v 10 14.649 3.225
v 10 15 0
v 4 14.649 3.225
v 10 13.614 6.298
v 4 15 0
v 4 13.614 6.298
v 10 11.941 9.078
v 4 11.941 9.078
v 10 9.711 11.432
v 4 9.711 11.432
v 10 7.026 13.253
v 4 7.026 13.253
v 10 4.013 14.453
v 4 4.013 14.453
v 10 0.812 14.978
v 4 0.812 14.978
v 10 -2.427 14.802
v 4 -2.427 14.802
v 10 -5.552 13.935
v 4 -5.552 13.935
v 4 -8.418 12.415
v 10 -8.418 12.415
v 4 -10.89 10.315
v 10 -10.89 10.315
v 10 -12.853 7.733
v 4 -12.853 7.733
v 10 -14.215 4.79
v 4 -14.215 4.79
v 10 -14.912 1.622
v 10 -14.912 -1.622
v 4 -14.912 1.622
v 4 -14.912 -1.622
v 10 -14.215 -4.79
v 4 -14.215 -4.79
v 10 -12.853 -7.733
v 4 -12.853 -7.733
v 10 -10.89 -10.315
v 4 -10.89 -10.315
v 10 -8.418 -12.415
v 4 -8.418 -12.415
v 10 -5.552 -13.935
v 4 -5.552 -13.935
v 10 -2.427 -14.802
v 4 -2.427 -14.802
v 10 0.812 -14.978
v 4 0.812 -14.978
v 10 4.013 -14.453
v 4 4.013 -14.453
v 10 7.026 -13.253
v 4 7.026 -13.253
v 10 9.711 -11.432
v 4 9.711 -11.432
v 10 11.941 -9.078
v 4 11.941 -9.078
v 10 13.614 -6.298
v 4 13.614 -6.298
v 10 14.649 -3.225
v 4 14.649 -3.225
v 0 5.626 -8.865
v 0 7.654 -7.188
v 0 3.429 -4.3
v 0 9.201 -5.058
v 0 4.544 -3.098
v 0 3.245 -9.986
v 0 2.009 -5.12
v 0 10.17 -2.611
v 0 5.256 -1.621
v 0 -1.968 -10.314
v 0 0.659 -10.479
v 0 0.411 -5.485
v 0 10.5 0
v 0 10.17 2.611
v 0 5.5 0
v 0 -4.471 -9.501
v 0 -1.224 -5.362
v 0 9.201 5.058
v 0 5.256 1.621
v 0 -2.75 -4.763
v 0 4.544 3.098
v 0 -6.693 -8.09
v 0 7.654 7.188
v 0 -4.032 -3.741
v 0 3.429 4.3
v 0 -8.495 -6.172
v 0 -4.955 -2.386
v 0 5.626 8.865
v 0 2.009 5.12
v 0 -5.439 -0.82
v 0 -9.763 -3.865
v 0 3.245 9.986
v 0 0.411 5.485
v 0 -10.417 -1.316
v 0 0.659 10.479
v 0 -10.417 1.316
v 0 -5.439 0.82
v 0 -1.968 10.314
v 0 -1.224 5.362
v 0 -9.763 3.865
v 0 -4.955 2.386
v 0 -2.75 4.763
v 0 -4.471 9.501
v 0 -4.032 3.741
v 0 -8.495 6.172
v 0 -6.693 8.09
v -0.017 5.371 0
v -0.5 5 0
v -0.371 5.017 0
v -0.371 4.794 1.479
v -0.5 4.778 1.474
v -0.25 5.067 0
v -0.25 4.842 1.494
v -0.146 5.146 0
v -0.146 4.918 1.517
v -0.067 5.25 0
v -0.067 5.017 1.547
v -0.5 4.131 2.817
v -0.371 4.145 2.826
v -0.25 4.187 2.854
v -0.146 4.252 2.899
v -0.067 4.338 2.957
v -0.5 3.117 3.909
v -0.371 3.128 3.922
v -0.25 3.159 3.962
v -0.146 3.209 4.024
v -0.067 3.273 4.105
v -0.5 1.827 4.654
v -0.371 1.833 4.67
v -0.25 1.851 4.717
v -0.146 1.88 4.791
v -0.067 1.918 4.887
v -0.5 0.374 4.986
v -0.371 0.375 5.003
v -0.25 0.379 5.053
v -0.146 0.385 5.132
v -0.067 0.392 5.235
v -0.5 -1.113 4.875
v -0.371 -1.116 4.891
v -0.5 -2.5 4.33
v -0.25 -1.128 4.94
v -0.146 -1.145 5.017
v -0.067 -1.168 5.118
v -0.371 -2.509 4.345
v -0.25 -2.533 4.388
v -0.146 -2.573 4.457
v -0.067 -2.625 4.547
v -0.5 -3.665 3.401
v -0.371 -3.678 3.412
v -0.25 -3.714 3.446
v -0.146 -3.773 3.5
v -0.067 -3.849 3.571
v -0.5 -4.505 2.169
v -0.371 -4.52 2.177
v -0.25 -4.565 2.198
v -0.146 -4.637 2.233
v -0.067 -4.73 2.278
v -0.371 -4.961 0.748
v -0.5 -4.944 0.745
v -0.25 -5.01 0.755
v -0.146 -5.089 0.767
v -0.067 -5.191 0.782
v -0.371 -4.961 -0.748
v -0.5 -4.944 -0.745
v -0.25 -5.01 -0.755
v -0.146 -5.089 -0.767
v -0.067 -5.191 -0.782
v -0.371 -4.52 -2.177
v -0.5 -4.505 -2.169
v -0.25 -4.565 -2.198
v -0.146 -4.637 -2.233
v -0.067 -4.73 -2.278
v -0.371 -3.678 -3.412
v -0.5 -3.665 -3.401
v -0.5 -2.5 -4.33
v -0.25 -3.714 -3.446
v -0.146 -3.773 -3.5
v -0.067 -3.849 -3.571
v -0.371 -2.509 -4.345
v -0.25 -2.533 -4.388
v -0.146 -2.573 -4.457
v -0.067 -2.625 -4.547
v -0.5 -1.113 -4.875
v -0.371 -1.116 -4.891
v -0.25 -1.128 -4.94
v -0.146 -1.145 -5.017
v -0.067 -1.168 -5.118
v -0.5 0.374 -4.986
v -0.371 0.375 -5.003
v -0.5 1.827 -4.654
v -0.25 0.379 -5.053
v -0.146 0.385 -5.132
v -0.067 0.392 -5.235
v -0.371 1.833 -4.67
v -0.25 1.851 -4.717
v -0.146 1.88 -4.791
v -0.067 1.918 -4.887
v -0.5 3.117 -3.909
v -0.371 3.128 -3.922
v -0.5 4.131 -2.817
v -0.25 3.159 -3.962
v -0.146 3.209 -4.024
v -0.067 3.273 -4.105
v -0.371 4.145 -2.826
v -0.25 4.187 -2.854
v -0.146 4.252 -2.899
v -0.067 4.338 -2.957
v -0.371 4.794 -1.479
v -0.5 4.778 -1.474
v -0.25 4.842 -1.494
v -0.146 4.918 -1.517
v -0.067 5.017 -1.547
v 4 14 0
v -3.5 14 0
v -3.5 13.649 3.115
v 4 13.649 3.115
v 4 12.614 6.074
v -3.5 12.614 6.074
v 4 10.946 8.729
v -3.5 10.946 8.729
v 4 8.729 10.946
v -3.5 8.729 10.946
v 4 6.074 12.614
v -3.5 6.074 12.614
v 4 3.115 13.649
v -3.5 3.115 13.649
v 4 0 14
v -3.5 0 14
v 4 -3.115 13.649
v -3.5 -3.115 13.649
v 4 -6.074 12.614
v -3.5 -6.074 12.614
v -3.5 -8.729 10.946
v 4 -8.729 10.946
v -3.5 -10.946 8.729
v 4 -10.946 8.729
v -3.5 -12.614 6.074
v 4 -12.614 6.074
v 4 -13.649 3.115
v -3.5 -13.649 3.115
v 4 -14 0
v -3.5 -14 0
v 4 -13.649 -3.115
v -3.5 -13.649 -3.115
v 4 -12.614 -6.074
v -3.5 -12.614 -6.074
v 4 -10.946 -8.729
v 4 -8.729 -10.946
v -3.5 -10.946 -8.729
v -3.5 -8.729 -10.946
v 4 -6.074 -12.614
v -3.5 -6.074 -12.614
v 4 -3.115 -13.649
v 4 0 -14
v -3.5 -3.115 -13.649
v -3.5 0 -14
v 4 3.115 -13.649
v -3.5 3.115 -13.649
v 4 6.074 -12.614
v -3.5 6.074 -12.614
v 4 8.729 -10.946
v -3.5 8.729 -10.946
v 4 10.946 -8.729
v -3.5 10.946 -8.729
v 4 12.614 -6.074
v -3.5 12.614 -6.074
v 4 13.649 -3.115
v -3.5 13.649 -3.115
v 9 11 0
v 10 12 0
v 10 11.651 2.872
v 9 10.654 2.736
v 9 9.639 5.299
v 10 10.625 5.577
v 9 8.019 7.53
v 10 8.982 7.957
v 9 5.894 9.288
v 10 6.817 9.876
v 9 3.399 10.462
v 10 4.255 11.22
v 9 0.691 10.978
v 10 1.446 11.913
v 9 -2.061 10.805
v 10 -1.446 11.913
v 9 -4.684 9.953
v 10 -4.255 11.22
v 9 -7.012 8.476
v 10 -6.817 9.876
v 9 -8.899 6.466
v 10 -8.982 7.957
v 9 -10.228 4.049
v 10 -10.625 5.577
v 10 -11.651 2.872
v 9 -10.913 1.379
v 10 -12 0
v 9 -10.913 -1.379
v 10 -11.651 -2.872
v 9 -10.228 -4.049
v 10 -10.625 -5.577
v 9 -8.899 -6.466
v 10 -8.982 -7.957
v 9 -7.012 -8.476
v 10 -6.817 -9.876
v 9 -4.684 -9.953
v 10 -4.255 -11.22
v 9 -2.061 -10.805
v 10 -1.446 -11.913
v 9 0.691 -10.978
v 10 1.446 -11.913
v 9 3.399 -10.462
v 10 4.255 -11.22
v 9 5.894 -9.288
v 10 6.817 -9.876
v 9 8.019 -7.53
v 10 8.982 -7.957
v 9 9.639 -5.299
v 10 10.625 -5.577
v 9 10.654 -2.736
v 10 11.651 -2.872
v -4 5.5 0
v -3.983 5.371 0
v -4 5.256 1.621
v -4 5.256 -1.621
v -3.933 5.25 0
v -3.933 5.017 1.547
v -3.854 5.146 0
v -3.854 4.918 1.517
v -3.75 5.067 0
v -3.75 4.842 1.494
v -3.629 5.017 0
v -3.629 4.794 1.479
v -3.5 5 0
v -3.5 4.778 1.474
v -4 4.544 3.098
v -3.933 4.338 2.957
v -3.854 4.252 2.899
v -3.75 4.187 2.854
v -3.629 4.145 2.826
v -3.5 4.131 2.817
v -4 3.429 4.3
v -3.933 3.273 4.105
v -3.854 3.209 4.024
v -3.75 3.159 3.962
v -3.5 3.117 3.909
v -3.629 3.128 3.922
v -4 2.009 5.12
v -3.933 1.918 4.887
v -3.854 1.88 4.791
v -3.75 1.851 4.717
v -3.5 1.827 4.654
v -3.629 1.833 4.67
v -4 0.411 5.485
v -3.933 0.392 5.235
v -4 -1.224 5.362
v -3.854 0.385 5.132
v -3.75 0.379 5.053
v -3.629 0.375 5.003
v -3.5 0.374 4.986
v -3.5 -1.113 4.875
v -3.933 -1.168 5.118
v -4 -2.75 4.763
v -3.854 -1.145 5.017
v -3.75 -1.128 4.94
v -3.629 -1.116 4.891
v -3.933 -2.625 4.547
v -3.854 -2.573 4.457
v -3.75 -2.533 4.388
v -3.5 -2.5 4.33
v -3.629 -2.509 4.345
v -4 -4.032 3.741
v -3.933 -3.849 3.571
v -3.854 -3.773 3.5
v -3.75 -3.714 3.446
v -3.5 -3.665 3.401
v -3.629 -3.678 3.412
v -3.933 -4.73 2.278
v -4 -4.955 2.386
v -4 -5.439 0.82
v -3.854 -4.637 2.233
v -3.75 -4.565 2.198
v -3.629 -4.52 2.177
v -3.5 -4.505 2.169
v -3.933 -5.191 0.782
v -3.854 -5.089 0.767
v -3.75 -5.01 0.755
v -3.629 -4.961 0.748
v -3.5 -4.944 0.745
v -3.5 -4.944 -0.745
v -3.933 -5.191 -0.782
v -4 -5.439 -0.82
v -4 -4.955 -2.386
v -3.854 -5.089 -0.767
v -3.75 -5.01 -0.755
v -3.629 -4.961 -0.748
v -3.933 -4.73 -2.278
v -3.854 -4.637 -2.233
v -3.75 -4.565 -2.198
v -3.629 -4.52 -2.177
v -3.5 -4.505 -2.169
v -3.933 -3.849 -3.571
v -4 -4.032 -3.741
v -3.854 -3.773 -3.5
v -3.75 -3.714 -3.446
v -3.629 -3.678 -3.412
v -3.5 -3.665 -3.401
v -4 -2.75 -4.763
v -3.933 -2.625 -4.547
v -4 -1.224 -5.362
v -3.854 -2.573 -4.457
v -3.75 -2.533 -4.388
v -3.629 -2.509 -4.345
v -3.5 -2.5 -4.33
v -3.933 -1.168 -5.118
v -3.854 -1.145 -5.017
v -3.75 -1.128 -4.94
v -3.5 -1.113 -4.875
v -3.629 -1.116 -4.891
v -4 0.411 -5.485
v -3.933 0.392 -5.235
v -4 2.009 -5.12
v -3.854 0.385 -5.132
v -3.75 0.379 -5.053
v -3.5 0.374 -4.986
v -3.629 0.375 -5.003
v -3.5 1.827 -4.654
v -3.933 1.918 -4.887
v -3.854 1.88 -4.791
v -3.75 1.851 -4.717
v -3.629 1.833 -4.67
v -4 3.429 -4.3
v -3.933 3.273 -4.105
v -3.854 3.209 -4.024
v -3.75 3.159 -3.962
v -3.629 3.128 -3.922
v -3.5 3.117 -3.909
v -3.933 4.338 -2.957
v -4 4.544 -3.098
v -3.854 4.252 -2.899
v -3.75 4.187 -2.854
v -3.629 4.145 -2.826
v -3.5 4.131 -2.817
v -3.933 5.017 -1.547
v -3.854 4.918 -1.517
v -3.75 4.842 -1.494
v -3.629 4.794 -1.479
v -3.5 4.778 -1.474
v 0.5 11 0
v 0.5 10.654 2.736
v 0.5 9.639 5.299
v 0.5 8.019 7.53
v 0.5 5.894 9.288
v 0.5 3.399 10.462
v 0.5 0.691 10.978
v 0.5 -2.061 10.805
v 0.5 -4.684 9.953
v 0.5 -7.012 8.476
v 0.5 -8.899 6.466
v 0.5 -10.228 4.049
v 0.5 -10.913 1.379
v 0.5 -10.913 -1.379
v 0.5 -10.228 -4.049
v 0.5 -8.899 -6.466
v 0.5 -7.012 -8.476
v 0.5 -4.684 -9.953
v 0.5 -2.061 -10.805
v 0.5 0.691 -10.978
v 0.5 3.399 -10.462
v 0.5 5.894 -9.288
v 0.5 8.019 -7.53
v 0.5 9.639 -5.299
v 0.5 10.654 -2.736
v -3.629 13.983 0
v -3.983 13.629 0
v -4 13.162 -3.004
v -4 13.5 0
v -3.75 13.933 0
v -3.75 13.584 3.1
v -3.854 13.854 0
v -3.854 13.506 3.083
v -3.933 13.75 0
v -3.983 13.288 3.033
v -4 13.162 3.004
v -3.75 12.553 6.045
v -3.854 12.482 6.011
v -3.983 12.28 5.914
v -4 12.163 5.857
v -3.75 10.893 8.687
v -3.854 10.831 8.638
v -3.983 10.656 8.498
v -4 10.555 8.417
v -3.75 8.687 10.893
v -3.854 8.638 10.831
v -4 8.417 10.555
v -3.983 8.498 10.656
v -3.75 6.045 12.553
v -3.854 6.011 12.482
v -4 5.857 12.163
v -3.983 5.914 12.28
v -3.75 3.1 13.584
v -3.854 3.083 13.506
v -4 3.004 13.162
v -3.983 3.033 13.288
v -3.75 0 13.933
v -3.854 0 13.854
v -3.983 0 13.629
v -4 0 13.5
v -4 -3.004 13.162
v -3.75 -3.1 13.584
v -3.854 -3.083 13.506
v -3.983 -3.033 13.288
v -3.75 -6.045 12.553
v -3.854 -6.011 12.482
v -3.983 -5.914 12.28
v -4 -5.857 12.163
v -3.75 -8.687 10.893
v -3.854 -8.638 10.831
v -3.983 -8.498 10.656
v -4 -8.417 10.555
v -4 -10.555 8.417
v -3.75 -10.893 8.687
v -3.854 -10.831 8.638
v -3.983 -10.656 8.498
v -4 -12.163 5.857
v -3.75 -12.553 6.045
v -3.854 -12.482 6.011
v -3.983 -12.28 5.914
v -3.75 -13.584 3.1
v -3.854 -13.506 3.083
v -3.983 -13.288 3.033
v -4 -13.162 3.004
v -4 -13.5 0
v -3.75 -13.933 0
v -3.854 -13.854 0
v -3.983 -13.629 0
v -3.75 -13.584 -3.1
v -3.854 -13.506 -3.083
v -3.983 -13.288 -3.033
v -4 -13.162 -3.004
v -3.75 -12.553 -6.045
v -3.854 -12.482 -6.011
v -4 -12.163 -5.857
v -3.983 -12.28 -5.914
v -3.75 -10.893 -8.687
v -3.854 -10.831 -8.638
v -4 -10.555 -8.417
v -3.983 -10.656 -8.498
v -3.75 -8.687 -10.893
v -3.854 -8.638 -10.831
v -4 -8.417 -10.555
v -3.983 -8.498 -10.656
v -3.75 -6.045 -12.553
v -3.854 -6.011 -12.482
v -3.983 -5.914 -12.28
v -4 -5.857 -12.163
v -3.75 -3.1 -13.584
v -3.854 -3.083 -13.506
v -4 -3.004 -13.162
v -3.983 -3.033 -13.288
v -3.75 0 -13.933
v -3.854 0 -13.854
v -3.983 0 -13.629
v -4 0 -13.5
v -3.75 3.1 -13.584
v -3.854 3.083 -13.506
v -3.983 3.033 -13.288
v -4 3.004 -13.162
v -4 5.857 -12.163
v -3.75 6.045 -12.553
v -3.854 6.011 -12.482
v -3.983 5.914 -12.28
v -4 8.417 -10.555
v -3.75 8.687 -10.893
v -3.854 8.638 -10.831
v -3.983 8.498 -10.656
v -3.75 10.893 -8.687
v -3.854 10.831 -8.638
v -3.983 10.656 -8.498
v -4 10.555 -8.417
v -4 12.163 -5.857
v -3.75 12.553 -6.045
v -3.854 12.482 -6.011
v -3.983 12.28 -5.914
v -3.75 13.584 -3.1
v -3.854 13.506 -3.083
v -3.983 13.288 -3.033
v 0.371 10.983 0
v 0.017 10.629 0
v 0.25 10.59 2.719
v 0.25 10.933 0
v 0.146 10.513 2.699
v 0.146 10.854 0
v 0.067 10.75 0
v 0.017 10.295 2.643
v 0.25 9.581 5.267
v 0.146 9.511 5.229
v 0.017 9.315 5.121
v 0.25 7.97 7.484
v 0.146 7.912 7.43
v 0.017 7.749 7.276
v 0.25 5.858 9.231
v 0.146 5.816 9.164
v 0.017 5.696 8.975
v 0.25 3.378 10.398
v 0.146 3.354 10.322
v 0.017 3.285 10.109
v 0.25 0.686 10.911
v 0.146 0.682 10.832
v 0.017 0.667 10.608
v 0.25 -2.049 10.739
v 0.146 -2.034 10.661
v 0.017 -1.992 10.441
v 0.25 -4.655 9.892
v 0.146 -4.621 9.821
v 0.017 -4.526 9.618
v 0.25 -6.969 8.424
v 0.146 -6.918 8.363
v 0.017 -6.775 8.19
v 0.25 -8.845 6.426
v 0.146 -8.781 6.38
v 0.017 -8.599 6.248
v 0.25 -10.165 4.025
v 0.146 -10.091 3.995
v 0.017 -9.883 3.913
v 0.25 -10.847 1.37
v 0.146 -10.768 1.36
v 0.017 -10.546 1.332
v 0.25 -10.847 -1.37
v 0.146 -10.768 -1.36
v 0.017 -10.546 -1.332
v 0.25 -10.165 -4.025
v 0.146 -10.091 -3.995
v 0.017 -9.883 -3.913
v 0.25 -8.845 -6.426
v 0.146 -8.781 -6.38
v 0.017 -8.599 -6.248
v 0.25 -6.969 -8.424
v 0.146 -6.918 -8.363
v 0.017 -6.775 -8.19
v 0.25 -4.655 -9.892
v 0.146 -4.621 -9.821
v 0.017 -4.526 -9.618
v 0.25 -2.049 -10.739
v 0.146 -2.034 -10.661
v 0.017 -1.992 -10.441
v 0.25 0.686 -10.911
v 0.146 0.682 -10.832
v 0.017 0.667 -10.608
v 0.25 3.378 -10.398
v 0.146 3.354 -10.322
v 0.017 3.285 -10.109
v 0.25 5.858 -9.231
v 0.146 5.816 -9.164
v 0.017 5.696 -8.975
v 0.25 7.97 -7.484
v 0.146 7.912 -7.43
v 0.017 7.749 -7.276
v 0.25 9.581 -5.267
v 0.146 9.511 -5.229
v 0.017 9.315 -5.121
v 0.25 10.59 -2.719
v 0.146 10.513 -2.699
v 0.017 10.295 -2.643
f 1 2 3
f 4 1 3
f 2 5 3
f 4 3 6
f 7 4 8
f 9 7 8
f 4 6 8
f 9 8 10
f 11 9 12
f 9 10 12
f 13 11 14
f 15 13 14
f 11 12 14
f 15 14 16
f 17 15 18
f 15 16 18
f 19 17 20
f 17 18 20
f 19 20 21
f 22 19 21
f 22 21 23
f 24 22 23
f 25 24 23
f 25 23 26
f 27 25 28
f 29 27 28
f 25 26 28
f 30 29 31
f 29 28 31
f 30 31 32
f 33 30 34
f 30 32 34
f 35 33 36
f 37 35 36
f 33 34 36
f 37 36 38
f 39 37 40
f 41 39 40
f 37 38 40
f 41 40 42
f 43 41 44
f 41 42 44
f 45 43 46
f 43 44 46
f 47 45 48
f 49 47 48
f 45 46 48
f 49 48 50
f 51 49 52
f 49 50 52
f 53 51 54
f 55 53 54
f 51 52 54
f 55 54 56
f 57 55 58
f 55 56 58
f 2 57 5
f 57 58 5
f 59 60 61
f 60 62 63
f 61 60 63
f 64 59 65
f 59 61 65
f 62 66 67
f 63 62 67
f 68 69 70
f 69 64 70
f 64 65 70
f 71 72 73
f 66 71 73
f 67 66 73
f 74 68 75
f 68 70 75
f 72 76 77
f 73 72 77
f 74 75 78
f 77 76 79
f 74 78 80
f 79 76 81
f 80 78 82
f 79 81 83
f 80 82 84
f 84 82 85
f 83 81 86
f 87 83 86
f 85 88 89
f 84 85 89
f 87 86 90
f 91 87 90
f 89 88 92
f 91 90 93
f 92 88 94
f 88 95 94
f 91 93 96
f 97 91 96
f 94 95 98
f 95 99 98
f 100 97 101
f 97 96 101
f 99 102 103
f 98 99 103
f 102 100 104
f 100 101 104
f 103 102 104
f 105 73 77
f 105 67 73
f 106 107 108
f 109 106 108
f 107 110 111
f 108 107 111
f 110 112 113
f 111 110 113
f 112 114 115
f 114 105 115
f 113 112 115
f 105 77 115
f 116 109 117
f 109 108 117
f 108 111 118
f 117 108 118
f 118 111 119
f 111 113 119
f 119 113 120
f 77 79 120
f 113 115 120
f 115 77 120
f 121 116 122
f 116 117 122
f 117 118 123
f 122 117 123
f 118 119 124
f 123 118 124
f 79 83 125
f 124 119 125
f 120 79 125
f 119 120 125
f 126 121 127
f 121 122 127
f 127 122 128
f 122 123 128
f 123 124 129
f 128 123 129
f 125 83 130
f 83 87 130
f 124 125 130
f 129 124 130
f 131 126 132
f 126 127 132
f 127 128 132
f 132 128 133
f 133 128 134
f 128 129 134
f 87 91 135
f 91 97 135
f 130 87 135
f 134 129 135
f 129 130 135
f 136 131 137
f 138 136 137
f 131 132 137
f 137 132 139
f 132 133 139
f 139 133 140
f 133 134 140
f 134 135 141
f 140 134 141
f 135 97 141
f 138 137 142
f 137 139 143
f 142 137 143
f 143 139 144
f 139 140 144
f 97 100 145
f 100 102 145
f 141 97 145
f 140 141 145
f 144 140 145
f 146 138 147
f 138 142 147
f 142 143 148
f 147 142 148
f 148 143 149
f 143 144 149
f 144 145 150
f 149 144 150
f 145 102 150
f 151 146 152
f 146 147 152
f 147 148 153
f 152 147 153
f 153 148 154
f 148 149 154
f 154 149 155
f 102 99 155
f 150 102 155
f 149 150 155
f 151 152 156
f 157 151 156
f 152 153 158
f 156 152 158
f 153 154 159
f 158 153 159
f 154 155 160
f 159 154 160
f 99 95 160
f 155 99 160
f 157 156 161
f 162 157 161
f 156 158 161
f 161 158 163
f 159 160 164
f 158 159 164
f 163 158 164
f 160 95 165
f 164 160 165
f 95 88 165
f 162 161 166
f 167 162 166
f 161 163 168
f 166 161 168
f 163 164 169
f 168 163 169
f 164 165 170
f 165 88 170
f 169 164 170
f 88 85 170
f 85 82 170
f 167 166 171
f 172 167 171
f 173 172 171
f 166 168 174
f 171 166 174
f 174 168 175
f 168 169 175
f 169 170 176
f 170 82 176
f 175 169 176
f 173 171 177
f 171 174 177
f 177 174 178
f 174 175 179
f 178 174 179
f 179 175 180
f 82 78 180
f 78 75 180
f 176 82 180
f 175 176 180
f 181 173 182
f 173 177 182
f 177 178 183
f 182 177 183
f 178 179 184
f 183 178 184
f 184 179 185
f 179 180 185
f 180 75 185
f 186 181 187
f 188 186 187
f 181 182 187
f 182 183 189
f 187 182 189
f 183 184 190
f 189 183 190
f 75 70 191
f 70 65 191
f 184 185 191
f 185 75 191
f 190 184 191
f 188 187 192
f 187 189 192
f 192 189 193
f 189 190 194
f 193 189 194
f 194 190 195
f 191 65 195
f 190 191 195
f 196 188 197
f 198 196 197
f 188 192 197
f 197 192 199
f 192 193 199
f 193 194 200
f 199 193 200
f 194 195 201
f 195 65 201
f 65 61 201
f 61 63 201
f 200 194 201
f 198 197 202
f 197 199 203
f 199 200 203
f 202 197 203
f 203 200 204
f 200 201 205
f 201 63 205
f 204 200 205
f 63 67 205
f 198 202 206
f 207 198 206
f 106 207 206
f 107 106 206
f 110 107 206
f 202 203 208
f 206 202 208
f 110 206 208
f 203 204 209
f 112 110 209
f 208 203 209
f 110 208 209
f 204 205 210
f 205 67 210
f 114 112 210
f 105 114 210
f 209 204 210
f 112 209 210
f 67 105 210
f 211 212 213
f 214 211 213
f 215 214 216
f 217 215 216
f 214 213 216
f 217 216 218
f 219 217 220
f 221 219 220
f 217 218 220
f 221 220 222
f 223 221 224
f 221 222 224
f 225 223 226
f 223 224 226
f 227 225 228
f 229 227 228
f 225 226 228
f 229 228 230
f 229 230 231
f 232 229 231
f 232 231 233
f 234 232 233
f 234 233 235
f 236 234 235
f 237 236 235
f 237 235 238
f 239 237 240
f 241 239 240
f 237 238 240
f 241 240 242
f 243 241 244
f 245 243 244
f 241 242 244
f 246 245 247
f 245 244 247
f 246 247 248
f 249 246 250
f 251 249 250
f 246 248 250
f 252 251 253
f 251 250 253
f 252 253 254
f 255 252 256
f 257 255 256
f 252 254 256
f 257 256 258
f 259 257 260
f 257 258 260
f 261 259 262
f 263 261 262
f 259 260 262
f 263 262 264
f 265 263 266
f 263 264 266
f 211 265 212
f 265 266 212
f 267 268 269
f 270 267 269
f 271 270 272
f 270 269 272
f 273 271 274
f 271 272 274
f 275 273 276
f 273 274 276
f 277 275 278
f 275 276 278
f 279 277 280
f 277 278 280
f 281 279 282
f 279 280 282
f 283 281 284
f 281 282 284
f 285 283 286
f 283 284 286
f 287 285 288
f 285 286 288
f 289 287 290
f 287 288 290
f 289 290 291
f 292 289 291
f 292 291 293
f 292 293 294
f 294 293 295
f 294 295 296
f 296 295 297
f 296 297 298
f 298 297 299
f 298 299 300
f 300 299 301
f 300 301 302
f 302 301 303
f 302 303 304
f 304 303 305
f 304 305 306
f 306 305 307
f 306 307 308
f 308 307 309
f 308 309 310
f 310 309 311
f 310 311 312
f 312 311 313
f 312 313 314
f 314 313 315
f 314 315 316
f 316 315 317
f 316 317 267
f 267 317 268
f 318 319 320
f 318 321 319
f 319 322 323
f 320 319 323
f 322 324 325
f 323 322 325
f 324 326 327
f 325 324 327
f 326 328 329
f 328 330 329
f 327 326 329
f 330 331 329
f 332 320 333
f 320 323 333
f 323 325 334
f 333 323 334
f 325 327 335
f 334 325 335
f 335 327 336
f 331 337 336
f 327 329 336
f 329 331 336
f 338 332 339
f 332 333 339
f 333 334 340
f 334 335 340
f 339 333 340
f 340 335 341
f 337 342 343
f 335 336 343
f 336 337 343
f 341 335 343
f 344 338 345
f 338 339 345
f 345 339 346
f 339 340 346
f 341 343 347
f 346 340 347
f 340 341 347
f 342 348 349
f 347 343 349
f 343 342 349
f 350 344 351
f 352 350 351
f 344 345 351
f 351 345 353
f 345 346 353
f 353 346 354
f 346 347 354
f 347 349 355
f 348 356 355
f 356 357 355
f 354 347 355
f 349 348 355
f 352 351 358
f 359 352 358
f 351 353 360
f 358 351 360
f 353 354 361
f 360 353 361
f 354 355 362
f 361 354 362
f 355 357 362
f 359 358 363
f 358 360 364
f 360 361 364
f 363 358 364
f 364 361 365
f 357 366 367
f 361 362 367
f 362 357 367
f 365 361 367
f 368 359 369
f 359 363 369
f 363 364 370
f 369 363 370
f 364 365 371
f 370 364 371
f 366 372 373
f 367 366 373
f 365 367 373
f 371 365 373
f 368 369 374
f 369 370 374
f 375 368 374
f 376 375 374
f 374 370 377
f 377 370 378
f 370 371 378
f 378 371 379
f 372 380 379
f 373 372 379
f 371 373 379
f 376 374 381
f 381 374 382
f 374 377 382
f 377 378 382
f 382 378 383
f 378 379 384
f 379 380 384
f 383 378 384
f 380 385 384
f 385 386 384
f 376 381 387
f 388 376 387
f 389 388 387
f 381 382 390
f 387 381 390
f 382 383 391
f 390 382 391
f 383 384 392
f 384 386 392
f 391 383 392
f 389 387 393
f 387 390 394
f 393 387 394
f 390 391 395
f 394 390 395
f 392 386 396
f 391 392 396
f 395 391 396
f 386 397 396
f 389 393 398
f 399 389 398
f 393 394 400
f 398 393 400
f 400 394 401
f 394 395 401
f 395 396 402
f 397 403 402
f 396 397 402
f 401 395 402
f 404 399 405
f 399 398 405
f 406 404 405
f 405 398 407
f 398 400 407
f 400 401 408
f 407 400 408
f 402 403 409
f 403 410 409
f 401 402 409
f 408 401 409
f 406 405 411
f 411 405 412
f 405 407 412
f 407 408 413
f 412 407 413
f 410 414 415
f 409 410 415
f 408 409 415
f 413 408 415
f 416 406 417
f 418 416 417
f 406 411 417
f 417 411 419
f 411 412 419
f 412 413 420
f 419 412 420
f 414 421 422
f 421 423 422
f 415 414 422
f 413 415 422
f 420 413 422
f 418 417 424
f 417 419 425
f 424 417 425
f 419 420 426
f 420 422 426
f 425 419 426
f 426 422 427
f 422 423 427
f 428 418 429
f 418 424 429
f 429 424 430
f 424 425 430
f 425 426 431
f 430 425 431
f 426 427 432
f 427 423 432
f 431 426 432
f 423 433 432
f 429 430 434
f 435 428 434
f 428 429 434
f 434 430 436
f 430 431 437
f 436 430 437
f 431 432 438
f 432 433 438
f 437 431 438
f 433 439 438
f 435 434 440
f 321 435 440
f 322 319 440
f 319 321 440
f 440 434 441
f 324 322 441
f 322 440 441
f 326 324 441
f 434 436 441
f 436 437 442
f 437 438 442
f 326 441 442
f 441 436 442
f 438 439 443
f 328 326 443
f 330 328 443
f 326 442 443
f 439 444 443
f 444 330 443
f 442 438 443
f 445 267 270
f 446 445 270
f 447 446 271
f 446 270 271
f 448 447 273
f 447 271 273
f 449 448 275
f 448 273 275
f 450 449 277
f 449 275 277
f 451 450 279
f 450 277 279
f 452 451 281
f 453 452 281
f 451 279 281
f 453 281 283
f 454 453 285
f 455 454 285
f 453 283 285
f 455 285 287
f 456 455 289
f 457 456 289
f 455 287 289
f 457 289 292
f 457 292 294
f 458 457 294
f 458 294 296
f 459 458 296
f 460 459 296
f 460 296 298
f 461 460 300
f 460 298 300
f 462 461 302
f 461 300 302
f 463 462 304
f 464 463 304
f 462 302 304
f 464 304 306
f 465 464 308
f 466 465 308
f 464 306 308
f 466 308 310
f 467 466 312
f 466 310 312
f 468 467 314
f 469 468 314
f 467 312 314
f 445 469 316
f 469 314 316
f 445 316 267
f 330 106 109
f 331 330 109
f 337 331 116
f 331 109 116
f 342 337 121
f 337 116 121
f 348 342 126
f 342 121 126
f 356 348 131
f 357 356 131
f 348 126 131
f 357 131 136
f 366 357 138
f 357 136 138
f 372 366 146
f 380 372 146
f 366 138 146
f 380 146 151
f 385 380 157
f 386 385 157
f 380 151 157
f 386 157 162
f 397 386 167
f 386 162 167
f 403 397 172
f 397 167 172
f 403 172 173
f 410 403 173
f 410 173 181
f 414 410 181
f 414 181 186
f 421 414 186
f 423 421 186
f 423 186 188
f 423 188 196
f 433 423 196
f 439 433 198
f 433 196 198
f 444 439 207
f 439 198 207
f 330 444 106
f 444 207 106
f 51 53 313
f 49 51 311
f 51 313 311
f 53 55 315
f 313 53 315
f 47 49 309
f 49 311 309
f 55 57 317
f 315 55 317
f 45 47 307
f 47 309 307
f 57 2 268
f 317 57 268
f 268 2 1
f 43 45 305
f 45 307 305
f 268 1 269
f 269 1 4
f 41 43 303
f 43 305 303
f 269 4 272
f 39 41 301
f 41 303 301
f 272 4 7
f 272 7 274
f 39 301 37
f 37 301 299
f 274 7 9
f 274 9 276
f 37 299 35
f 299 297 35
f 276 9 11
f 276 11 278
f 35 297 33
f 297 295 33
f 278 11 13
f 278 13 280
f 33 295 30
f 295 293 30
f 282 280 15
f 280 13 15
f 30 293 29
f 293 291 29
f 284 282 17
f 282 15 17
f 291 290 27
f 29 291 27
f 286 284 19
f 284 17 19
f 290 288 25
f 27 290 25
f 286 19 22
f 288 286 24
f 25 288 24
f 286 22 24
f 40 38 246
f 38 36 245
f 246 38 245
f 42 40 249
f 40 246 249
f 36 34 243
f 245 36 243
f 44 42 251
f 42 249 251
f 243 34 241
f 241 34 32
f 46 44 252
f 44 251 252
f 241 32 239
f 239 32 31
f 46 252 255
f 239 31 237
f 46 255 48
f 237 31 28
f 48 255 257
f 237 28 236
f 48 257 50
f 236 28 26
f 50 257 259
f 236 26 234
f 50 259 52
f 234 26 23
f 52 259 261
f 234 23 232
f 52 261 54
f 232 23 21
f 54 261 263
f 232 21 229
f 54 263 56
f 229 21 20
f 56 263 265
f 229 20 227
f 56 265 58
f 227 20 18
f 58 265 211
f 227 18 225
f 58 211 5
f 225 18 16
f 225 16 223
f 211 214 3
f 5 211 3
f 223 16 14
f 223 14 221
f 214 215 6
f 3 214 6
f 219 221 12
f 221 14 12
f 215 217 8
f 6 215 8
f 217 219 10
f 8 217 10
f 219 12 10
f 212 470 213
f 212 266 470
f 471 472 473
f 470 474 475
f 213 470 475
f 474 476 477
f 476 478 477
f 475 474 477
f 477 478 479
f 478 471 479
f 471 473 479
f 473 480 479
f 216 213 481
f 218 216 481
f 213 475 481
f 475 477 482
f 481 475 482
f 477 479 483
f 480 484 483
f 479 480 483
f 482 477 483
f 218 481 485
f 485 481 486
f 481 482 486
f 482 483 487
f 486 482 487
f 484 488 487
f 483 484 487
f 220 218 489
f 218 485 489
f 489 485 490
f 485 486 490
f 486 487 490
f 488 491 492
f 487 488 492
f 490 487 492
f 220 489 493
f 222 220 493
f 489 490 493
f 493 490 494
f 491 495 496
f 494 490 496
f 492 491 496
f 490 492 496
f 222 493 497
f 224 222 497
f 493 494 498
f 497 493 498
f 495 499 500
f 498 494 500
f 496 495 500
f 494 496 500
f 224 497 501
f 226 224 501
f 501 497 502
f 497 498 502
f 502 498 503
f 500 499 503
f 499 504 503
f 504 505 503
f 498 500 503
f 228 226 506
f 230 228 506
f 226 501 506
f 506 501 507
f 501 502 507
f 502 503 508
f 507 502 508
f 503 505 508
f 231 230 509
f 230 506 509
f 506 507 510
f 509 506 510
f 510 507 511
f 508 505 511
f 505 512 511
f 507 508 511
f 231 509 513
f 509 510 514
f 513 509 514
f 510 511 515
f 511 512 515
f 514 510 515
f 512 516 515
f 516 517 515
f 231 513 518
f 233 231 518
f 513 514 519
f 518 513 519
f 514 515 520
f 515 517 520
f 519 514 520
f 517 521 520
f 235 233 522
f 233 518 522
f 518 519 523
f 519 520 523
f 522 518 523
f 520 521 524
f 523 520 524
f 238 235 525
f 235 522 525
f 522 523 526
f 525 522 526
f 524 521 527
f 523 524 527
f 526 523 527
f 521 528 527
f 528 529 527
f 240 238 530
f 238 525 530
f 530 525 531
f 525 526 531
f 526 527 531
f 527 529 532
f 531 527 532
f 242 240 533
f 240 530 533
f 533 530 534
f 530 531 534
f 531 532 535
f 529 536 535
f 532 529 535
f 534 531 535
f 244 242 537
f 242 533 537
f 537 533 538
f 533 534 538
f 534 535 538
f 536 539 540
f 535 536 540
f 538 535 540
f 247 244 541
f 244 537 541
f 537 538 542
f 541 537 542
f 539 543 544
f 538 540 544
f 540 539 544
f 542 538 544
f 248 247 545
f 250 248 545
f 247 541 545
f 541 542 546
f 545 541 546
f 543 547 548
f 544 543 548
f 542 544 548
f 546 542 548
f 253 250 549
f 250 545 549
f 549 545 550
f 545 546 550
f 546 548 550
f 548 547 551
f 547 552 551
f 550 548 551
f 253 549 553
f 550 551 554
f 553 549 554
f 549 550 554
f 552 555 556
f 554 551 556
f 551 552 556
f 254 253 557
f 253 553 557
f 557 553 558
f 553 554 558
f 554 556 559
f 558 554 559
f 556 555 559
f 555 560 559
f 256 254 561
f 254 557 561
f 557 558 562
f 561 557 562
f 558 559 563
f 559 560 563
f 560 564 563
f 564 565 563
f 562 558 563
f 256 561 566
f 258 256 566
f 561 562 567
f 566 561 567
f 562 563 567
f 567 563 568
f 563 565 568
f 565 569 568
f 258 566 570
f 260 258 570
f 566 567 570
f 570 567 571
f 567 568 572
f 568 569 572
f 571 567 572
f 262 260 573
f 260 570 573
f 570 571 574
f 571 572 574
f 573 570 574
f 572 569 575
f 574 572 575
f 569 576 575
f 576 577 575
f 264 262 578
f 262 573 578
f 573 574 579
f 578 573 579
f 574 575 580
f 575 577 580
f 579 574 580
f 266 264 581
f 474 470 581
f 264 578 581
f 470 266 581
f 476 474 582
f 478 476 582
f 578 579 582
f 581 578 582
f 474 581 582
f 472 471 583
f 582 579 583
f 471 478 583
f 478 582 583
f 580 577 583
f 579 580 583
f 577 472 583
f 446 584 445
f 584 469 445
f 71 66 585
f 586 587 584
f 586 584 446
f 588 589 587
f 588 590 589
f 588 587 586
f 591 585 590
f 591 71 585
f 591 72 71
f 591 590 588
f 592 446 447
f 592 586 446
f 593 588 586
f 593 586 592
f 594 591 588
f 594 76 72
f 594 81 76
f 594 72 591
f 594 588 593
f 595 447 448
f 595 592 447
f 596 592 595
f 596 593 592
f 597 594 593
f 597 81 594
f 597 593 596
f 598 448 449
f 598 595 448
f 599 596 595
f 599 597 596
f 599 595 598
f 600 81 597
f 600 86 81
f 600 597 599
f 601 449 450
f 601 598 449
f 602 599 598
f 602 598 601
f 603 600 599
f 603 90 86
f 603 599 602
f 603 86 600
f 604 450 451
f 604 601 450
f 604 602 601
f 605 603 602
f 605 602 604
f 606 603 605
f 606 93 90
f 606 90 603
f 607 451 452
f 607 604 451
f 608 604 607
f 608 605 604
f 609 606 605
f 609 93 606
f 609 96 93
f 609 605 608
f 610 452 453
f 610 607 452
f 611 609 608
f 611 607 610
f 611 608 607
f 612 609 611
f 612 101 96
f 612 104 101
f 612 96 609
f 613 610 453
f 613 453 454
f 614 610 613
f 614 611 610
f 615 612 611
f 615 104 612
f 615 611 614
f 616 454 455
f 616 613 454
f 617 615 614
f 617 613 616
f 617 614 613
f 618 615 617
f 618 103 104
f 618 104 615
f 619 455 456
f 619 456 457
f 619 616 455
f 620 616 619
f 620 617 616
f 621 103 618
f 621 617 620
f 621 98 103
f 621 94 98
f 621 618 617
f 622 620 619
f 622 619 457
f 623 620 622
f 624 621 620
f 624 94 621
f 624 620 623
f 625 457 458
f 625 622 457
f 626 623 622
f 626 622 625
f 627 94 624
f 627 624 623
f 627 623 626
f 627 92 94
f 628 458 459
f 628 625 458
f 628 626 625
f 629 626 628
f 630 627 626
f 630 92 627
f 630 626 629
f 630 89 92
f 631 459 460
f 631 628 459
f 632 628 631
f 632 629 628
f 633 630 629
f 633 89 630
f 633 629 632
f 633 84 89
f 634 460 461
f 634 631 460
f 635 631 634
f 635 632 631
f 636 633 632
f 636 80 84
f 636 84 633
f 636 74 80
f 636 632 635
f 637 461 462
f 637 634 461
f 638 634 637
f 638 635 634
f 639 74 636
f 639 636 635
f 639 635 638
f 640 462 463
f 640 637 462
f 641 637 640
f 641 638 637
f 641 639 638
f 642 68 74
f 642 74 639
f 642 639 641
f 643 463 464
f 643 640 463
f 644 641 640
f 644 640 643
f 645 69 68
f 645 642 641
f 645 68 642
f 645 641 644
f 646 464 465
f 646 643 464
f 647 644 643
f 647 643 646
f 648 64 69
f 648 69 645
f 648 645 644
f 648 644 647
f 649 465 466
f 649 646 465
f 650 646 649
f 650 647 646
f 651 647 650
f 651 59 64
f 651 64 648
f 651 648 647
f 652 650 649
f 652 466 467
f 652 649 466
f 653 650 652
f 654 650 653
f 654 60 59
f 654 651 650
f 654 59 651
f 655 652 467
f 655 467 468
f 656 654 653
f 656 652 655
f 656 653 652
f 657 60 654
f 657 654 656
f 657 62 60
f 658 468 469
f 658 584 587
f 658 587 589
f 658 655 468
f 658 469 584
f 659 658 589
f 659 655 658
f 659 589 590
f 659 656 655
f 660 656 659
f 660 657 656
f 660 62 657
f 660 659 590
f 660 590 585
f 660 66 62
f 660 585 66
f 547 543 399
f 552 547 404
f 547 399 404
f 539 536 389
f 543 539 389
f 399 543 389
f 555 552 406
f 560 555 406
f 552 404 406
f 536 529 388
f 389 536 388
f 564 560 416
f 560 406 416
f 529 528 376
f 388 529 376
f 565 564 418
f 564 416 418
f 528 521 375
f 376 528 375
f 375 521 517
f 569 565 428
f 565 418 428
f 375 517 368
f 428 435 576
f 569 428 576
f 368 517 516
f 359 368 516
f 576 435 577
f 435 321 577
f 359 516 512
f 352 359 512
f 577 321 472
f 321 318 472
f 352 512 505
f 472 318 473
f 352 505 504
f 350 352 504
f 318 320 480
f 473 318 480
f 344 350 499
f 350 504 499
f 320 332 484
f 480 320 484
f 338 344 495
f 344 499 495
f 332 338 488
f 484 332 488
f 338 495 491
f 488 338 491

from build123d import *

# Parameters (mm, degrees)
REDONDEO1_R   = 0.5
CHAFL_N1_SIZE = 1


with BuildPart() as part:
    # Croquis1 → Revolución1 (revolve)
    with BuildSketch(Plane.XY):
        Polygon((0, 11), (10, 11), (10, 14), (10, 15), (4, 15), (4, 14), (-4, 14), (-4, 5), (0, 5), align=None)
    revolve(axis=Axis((-5.995381062, 0, 0), (1, 0, 0)))

    # Redondeo1
    redondeo1_edges = [part.edges().sort_by_distance(p)[0] for p in [
        (0, -11, 0),
        (0, -5, 0),
        (-4, -5, 0),
        (-4, -14, 0),
    ]]
    fillet(redondeo1_edges, radius=REDONDEO1_R)

    # Chaflán1
    chafl_n1_edges = [part.edges().sort_by_distance(p)[0] for p in [
        (10, -11, 0),
    ]]
    chamfer(chafl_n1_edges, length=CHAFL_N1_SIZE)


solid = part.part
